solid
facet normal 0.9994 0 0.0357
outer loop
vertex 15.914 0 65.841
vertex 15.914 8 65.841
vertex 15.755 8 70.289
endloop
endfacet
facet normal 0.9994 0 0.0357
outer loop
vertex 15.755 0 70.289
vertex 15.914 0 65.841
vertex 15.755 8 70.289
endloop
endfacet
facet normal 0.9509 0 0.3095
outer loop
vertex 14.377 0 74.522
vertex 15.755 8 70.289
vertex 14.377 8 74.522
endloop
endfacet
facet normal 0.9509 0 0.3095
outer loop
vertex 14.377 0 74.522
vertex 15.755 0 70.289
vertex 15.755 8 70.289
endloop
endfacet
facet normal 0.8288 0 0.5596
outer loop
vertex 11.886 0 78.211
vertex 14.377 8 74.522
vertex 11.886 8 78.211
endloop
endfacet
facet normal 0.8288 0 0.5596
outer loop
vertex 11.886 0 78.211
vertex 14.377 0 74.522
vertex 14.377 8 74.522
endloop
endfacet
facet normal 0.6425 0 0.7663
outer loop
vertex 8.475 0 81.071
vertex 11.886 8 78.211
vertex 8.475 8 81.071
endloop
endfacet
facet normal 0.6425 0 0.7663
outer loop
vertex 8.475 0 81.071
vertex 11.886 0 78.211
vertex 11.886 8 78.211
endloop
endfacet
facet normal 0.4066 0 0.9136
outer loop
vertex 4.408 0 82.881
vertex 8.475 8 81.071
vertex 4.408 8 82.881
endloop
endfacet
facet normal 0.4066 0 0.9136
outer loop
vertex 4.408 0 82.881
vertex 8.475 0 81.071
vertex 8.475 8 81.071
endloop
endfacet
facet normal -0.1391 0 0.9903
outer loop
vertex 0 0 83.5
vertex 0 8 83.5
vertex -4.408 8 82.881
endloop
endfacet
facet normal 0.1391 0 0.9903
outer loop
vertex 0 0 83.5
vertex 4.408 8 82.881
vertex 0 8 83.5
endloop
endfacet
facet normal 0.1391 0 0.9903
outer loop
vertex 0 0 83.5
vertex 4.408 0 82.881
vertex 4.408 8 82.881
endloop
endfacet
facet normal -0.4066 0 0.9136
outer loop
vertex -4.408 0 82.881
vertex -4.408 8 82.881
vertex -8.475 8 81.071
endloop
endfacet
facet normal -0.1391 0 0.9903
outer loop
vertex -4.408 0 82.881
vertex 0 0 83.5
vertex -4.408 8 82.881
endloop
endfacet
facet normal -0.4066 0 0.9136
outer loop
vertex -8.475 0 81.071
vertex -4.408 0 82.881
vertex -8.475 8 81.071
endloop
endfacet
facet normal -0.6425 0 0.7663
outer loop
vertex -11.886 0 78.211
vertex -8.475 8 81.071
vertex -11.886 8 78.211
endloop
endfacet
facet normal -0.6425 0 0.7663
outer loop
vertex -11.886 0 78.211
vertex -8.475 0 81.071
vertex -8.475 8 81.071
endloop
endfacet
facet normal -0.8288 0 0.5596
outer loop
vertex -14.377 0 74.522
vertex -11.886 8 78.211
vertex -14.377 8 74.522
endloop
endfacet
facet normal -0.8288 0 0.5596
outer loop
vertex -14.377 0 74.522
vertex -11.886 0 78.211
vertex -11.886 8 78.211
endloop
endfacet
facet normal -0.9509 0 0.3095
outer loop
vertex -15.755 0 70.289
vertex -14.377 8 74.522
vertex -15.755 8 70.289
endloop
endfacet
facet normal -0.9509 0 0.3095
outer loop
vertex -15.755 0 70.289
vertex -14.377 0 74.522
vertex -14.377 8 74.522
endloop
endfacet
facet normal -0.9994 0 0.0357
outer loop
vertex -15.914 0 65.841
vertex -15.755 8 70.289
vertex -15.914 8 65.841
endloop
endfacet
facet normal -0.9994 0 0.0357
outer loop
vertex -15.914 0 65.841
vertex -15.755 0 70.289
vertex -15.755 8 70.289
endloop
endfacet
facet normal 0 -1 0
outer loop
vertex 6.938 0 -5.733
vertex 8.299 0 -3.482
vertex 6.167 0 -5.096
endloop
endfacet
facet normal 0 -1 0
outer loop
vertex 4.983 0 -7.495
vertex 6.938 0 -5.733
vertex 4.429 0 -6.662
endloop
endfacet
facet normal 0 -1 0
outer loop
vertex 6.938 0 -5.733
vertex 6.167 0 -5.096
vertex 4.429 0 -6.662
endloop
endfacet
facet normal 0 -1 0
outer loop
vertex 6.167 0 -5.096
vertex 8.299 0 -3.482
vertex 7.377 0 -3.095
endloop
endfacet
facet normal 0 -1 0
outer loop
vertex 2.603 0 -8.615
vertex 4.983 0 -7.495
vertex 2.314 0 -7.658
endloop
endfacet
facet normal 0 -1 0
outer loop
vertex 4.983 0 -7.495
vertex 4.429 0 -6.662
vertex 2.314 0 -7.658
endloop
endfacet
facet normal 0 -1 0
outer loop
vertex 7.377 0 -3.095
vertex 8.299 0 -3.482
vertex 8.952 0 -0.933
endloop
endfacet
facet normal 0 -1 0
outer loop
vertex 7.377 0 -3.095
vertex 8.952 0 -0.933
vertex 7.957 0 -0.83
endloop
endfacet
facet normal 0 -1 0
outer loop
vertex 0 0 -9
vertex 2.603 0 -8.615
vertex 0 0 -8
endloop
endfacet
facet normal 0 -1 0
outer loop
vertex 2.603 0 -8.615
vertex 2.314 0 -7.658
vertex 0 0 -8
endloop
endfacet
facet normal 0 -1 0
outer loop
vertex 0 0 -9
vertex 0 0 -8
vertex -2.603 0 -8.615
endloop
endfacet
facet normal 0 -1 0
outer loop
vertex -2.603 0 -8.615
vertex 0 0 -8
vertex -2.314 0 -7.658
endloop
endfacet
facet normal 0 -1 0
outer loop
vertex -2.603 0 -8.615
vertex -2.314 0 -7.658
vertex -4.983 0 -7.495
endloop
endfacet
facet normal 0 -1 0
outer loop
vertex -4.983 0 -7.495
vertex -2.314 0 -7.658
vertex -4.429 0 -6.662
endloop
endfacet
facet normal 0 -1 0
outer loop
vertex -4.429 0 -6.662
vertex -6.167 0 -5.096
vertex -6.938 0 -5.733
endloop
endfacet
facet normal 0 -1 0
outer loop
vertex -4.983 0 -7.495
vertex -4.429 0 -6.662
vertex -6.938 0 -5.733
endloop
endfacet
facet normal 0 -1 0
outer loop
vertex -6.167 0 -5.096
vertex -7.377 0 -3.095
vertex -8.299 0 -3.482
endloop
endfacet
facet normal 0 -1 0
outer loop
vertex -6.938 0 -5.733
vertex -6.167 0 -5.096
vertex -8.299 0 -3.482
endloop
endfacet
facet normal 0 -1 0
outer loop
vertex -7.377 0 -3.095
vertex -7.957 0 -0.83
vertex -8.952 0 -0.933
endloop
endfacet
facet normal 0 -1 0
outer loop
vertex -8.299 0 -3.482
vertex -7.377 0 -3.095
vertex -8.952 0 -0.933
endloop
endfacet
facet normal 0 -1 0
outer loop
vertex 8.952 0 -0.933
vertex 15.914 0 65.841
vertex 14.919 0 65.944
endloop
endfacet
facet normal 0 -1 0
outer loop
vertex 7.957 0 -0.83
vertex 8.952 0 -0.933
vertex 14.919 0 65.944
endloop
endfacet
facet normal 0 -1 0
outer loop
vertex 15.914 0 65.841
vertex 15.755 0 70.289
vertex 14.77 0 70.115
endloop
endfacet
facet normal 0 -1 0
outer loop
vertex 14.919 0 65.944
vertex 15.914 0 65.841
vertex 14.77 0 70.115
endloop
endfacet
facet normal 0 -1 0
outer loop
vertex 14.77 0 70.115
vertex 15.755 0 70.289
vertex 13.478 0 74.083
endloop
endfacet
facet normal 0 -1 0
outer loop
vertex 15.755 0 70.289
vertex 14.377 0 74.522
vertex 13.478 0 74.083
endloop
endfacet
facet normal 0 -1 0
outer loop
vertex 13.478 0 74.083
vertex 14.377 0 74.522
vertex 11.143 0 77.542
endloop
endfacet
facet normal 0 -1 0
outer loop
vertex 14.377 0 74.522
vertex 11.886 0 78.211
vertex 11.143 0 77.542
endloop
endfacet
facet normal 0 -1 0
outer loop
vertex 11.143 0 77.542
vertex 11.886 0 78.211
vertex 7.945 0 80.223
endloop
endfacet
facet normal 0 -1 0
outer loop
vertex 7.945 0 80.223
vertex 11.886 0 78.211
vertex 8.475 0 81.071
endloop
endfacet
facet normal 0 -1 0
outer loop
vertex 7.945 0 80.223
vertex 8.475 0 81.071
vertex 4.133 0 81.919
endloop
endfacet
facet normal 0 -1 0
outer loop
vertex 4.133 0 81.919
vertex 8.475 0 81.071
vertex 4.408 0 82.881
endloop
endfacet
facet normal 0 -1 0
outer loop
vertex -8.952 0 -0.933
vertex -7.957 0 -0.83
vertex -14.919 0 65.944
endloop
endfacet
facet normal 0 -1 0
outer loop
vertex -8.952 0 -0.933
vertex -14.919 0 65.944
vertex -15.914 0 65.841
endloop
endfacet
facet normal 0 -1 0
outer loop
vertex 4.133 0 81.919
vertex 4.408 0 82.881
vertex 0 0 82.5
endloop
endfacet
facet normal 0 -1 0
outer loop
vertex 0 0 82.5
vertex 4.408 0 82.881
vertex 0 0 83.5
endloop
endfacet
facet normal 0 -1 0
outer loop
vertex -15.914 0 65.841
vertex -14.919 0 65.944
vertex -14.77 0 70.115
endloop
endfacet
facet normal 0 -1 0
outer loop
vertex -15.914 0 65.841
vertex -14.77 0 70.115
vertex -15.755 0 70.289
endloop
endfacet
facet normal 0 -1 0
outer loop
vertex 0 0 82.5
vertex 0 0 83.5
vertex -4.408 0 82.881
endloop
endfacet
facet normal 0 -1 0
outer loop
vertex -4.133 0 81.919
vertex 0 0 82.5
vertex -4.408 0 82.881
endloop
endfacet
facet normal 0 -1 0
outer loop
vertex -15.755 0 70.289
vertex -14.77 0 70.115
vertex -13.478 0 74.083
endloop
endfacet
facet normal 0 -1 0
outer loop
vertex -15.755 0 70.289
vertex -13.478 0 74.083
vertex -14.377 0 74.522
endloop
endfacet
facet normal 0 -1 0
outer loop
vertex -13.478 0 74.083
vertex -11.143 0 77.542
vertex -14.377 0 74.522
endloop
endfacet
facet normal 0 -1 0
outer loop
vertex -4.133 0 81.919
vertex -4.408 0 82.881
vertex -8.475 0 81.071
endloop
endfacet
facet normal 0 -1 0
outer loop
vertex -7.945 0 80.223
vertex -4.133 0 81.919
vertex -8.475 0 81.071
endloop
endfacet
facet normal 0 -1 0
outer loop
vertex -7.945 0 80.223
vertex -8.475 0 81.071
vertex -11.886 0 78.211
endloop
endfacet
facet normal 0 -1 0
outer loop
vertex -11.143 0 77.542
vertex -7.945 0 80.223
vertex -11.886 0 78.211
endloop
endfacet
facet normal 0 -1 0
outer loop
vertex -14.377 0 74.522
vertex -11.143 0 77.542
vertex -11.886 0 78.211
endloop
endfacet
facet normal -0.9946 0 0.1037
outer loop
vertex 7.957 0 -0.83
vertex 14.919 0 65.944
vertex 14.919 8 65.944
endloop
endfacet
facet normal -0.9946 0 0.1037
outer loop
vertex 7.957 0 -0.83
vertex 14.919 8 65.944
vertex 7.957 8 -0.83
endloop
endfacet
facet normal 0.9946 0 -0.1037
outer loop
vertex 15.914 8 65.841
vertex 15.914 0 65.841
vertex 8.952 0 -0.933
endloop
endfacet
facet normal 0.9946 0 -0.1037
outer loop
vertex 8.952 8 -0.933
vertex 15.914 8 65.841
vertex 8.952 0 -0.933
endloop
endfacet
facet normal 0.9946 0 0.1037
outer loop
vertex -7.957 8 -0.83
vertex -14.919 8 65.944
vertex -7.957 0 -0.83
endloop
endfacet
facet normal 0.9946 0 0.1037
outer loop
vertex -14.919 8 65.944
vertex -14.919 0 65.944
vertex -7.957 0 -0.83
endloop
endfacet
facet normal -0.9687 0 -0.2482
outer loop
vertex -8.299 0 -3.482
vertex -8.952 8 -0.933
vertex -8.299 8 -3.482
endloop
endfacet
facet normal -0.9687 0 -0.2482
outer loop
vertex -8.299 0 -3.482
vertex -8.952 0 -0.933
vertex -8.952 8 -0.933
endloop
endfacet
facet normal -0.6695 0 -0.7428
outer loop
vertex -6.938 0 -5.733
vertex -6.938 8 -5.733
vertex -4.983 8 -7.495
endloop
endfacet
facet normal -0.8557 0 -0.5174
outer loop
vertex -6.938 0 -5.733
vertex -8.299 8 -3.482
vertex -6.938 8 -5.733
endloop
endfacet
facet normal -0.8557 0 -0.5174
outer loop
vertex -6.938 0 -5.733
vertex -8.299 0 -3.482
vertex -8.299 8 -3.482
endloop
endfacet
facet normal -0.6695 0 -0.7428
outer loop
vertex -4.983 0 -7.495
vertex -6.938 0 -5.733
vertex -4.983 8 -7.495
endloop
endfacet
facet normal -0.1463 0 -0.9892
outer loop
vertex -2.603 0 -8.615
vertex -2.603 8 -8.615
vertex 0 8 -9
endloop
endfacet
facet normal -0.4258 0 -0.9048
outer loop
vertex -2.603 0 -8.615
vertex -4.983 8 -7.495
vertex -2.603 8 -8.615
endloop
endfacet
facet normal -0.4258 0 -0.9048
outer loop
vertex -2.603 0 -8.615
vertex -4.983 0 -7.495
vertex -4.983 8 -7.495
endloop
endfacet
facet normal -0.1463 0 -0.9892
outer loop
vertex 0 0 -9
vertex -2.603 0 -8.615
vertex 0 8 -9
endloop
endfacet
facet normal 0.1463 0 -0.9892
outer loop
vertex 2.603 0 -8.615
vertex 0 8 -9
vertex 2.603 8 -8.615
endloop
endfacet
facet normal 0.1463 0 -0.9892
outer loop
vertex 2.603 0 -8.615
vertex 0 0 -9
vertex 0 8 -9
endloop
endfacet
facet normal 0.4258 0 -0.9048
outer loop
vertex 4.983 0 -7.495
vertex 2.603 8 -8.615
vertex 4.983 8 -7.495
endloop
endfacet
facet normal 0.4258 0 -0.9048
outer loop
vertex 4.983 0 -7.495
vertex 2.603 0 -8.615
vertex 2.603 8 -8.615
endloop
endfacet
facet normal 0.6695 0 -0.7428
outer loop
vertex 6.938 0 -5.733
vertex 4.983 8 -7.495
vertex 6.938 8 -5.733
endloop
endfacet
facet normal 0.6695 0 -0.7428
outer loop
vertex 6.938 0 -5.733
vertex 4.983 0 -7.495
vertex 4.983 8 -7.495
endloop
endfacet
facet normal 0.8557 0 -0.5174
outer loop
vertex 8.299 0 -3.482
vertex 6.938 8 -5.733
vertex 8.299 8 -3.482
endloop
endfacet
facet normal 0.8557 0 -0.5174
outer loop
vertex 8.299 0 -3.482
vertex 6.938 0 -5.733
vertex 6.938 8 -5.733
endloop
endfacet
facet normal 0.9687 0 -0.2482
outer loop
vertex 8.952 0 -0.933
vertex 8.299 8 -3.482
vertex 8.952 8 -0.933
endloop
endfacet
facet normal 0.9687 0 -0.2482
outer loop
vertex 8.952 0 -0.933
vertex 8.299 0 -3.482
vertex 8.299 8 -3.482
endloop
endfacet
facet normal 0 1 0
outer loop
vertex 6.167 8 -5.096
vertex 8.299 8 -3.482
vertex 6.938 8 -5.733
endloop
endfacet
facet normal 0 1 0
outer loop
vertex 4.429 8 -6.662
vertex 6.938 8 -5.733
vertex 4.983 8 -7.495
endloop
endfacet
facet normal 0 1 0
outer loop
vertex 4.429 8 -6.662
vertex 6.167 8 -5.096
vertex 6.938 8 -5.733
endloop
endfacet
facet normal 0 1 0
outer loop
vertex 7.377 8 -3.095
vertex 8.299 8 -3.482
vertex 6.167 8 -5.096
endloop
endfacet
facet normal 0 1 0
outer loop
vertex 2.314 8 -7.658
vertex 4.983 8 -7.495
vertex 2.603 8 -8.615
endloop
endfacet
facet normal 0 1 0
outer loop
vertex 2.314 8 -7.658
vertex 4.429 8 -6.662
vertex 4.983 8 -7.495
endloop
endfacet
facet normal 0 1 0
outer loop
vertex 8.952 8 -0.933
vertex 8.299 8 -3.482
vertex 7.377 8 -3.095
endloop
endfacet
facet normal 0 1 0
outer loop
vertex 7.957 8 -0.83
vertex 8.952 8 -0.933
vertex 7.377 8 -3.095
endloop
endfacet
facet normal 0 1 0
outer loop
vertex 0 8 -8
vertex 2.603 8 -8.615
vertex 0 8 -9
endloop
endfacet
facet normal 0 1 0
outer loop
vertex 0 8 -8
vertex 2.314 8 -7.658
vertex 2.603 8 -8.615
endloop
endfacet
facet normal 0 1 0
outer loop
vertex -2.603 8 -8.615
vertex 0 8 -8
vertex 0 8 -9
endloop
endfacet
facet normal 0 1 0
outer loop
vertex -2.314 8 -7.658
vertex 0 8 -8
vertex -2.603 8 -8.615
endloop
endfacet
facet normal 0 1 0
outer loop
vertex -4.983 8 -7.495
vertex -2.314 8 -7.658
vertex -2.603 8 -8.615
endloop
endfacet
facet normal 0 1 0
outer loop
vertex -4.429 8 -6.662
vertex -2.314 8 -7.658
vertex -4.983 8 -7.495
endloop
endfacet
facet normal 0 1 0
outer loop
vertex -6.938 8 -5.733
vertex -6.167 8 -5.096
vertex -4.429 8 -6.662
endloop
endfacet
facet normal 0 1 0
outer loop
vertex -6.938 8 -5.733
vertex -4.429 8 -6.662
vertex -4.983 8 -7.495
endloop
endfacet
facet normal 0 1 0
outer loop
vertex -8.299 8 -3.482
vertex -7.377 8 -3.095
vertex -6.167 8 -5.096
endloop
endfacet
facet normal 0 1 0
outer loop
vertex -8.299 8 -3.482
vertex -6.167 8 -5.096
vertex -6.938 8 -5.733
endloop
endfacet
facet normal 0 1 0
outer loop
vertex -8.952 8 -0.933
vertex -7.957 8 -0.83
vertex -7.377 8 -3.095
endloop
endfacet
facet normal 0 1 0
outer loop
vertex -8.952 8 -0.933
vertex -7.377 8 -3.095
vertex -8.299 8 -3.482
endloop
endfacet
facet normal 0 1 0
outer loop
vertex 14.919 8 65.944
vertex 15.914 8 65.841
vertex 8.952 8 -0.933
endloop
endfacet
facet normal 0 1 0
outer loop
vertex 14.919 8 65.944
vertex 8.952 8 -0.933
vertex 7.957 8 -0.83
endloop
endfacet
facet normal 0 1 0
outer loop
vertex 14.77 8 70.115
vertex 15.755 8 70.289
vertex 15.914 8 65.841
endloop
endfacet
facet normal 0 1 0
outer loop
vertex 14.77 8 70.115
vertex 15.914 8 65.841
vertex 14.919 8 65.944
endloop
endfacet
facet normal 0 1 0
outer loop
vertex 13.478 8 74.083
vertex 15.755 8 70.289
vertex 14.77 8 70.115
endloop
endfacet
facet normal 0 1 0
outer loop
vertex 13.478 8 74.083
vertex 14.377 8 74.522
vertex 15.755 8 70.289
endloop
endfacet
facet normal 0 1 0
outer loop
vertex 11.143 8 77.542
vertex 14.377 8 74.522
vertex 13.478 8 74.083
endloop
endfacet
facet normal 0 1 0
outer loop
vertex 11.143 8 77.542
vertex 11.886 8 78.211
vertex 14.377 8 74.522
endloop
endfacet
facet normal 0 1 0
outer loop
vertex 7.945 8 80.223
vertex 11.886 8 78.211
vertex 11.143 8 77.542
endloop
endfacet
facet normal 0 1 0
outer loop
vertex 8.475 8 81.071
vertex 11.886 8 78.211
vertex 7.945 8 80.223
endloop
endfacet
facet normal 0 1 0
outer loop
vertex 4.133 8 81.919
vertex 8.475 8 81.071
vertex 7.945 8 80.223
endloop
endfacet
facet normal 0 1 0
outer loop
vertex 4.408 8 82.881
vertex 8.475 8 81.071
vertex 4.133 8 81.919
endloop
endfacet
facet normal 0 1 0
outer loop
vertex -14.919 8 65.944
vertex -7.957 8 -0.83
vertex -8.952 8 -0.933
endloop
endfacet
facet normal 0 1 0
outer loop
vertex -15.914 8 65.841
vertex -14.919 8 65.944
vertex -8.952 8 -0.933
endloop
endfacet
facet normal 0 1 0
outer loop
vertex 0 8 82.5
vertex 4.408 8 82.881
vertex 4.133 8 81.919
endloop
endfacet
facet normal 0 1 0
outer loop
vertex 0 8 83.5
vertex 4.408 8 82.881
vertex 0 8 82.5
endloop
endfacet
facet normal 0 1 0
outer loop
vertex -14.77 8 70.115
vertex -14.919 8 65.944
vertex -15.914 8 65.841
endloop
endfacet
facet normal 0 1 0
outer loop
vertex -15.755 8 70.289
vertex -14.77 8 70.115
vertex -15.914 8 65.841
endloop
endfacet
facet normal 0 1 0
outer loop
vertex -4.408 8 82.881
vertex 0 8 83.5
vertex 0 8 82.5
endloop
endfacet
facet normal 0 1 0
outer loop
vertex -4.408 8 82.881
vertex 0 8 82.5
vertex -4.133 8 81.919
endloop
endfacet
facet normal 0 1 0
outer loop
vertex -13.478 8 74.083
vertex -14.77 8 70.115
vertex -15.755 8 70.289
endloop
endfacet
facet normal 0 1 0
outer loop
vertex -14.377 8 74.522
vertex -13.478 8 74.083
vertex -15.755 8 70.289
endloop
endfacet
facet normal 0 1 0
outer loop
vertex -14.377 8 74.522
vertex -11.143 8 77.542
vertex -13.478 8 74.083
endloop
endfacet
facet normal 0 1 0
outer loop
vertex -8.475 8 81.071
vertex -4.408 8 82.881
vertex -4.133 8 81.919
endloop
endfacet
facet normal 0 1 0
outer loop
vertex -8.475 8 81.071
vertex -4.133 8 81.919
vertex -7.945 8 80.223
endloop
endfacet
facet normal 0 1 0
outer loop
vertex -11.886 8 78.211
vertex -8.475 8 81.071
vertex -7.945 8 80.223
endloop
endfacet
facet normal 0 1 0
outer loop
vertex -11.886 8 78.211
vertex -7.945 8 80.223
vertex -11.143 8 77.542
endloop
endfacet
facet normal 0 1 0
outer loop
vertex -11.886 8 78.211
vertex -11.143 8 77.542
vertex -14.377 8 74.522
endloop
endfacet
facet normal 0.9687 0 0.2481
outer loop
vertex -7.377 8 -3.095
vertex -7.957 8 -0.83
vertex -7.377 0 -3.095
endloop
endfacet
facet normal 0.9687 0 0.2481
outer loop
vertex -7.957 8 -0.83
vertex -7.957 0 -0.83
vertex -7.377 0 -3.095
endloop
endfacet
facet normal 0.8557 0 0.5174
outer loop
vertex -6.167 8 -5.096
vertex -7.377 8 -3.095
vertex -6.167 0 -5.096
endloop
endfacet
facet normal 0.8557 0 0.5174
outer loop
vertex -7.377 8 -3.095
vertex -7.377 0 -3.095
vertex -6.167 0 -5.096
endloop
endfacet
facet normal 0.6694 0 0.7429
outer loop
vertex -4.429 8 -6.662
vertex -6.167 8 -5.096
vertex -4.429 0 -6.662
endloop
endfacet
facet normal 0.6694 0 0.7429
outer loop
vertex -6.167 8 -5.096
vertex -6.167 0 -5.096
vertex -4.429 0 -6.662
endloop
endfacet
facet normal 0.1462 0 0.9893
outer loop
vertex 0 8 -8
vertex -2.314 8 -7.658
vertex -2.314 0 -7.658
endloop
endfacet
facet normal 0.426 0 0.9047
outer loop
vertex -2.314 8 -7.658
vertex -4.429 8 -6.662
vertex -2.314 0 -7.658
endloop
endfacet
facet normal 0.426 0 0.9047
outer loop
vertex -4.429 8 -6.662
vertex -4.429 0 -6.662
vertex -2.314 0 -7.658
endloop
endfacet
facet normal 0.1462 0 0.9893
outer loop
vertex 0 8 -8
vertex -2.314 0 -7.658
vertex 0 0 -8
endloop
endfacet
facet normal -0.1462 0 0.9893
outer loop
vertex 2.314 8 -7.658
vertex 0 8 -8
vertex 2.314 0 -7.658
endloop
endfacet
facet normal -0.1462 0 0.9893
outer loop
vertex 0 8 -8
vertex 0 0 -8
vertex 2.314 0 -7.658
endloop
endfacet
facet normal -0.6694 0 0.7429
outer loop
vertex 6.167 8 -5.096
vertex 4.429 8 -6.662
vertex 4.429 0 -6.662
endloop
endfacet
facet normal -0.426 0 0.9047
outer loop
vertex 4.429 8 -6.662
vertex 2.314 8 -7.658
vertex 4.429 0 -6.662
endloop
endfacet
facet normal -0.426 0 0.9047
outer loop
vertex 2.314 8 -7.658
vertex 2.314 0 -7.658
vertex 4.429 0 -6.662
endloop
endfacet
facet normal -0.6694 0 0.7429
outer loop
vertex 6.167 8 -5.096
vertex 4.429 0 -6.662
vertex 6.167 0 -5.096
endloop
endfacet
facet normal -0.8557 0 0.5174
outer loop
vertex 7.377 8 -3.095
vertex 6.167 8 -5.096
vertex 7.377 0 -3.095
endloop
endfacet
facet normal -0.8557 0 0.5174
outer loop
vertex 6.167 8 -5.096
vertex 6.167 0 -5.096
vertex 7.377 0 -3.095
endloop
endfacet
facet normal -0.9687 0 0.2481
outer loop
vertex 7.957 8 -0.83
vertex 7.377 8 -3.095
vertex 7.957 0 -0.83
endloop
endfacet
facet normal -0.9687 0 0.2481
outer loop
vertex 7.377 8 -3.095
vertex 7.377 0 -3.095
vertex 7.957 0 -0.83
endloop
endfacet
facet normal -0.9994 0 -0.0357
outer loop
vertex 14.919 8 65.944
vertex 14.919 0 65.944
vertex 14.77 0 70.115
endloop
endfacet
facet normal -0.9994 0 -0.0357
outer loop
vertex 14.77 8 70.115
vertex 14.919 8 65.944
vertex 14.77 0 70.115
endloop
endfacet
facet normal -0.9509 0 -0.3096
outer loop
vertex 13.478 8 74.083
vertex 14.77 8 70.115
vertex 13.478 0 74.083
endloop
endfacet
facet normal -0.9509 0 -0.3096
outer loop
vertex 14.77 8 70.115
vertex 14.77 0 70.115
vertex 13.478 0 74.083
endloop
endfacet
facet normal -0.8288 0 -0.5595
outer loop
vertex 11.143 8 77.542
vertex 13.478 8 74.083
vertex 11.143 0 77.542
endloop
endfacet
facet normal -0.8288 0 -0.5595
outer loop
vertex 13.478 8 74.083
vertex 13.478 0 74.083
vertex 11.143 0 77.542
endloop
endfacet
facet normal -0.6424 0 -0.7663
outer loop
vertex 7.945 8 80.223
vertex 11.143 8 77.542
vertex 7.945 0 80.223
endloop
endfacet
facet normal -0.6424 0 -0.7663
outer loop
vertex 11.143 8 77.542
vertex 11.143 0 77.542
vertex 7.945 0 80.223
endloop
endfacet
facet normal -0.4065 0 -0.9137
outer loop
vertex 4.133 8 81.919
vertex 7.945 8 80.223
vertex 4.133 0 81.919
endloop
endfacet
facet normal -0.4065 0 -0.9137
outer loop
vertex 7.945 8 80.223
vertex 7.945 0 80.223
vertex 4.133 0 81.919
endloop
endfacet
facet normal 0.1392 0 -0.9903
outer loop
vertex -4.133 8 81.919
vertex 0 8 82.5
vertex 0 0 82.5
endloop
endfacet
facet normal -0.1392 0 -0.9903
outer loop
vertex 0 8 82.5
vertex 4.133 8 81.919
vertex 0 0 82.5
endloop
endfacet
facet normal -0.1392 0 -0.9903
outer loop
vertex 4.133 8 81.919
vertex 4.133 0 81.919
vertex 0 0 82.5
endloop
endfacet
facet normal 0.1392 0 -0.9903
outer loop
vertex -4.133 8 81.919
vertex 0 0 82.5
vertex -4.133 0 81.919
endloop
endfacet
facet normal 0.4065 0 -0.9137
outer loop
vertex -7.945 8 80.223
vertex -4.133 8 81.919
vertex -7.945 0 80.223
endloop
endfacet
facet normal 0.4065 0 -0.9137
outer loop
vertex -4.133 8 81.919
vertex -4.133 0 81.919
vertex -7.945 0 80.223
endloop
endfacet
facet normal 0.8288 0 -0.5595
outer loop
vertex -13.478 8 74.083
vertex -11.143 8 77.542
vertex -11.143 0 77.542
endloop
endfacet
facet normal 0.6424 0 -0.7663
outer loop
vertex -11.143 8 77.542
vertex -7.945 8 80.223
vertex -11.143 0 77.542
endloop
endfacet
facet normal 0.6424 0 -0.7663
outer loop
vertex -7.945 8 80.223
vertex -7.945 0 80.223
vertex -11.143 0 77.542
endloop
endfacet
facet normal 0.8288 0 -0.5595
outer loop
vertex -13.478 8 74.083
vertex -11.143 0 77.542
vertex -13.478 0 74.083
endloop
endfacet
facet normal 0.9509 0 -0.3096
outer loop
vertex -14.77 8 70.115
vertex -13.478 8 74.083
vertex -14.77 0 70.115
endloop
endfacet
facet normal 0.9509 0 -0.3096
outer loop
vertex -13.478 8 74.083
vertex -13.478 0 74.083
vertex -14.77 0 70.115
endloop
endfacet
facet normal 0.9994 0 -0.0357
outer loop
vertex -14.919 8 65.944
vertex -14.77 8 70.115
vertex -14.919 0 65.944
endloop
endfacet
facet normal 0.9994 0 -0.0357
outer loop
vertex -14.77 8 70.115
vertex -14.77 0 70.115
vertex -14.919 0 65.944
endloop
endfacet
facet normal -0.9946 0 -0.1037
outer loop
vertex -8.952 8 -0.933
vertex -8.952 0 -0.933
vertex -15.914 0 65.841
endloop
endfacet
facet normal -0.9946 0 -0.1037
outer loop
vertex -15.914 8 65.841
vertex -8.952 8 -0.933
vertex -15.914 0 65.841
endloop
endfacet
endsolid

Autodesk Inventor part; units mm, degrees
ref_plane "YZ Plane" through (0, 0, 0) normal (1, 0, 0) x (0, 1, 0)
ref_plane "XZ Plane" through (0, 0, 0) normal (0, 1, 0) x (-1, 0, 0)
ref_plane "XY Plane" through (0, 0, 0) normal (0, 0, 1) x (1, 0, 0)
sketch "Sketch1" plane through (0, 0, 0) normal (0, 1, 0) x (-1, 0, 0)
  arc A0 (-7.9569, -0.8296) -> (7.9569, -0.8296) centre (0, 0) ccw
  line L0 (0, 0) -> (0, 67.5) construction
  arc A1 (14.9191, 65.9444) -> (-14.9191, 65.9444) centre (0, 67.5) ccw
  line L1 (14.9191, 65.9444) -> (7.9569, -0.8296)
  line L2 (-14.9191, 65.9444) -> (-7.9569, -0.8296)
  line L3 (8.9515, -0.9333) -> (15.9137, 65.8407)
  arc A2 (15.9137, 65.8407) -> (-15.9137, 65.8407) centre (0, 67.5) ccw
  line L4 (-15.9137, 65.8407) -> (-8.9515, -0.9333)
  arc A3 (-8.9515, -0.9333) -> (8.9515, -0.9333) centre (0, 0) ccw
  dimension "d0" = 16
  dimension "d1" = 67.5
  dimension "d2" = 30
  dimension "d3" = 1
extrude "Extrusion1" add sketch "Sketch1" along normal blind 8
properties part number "Belt"
